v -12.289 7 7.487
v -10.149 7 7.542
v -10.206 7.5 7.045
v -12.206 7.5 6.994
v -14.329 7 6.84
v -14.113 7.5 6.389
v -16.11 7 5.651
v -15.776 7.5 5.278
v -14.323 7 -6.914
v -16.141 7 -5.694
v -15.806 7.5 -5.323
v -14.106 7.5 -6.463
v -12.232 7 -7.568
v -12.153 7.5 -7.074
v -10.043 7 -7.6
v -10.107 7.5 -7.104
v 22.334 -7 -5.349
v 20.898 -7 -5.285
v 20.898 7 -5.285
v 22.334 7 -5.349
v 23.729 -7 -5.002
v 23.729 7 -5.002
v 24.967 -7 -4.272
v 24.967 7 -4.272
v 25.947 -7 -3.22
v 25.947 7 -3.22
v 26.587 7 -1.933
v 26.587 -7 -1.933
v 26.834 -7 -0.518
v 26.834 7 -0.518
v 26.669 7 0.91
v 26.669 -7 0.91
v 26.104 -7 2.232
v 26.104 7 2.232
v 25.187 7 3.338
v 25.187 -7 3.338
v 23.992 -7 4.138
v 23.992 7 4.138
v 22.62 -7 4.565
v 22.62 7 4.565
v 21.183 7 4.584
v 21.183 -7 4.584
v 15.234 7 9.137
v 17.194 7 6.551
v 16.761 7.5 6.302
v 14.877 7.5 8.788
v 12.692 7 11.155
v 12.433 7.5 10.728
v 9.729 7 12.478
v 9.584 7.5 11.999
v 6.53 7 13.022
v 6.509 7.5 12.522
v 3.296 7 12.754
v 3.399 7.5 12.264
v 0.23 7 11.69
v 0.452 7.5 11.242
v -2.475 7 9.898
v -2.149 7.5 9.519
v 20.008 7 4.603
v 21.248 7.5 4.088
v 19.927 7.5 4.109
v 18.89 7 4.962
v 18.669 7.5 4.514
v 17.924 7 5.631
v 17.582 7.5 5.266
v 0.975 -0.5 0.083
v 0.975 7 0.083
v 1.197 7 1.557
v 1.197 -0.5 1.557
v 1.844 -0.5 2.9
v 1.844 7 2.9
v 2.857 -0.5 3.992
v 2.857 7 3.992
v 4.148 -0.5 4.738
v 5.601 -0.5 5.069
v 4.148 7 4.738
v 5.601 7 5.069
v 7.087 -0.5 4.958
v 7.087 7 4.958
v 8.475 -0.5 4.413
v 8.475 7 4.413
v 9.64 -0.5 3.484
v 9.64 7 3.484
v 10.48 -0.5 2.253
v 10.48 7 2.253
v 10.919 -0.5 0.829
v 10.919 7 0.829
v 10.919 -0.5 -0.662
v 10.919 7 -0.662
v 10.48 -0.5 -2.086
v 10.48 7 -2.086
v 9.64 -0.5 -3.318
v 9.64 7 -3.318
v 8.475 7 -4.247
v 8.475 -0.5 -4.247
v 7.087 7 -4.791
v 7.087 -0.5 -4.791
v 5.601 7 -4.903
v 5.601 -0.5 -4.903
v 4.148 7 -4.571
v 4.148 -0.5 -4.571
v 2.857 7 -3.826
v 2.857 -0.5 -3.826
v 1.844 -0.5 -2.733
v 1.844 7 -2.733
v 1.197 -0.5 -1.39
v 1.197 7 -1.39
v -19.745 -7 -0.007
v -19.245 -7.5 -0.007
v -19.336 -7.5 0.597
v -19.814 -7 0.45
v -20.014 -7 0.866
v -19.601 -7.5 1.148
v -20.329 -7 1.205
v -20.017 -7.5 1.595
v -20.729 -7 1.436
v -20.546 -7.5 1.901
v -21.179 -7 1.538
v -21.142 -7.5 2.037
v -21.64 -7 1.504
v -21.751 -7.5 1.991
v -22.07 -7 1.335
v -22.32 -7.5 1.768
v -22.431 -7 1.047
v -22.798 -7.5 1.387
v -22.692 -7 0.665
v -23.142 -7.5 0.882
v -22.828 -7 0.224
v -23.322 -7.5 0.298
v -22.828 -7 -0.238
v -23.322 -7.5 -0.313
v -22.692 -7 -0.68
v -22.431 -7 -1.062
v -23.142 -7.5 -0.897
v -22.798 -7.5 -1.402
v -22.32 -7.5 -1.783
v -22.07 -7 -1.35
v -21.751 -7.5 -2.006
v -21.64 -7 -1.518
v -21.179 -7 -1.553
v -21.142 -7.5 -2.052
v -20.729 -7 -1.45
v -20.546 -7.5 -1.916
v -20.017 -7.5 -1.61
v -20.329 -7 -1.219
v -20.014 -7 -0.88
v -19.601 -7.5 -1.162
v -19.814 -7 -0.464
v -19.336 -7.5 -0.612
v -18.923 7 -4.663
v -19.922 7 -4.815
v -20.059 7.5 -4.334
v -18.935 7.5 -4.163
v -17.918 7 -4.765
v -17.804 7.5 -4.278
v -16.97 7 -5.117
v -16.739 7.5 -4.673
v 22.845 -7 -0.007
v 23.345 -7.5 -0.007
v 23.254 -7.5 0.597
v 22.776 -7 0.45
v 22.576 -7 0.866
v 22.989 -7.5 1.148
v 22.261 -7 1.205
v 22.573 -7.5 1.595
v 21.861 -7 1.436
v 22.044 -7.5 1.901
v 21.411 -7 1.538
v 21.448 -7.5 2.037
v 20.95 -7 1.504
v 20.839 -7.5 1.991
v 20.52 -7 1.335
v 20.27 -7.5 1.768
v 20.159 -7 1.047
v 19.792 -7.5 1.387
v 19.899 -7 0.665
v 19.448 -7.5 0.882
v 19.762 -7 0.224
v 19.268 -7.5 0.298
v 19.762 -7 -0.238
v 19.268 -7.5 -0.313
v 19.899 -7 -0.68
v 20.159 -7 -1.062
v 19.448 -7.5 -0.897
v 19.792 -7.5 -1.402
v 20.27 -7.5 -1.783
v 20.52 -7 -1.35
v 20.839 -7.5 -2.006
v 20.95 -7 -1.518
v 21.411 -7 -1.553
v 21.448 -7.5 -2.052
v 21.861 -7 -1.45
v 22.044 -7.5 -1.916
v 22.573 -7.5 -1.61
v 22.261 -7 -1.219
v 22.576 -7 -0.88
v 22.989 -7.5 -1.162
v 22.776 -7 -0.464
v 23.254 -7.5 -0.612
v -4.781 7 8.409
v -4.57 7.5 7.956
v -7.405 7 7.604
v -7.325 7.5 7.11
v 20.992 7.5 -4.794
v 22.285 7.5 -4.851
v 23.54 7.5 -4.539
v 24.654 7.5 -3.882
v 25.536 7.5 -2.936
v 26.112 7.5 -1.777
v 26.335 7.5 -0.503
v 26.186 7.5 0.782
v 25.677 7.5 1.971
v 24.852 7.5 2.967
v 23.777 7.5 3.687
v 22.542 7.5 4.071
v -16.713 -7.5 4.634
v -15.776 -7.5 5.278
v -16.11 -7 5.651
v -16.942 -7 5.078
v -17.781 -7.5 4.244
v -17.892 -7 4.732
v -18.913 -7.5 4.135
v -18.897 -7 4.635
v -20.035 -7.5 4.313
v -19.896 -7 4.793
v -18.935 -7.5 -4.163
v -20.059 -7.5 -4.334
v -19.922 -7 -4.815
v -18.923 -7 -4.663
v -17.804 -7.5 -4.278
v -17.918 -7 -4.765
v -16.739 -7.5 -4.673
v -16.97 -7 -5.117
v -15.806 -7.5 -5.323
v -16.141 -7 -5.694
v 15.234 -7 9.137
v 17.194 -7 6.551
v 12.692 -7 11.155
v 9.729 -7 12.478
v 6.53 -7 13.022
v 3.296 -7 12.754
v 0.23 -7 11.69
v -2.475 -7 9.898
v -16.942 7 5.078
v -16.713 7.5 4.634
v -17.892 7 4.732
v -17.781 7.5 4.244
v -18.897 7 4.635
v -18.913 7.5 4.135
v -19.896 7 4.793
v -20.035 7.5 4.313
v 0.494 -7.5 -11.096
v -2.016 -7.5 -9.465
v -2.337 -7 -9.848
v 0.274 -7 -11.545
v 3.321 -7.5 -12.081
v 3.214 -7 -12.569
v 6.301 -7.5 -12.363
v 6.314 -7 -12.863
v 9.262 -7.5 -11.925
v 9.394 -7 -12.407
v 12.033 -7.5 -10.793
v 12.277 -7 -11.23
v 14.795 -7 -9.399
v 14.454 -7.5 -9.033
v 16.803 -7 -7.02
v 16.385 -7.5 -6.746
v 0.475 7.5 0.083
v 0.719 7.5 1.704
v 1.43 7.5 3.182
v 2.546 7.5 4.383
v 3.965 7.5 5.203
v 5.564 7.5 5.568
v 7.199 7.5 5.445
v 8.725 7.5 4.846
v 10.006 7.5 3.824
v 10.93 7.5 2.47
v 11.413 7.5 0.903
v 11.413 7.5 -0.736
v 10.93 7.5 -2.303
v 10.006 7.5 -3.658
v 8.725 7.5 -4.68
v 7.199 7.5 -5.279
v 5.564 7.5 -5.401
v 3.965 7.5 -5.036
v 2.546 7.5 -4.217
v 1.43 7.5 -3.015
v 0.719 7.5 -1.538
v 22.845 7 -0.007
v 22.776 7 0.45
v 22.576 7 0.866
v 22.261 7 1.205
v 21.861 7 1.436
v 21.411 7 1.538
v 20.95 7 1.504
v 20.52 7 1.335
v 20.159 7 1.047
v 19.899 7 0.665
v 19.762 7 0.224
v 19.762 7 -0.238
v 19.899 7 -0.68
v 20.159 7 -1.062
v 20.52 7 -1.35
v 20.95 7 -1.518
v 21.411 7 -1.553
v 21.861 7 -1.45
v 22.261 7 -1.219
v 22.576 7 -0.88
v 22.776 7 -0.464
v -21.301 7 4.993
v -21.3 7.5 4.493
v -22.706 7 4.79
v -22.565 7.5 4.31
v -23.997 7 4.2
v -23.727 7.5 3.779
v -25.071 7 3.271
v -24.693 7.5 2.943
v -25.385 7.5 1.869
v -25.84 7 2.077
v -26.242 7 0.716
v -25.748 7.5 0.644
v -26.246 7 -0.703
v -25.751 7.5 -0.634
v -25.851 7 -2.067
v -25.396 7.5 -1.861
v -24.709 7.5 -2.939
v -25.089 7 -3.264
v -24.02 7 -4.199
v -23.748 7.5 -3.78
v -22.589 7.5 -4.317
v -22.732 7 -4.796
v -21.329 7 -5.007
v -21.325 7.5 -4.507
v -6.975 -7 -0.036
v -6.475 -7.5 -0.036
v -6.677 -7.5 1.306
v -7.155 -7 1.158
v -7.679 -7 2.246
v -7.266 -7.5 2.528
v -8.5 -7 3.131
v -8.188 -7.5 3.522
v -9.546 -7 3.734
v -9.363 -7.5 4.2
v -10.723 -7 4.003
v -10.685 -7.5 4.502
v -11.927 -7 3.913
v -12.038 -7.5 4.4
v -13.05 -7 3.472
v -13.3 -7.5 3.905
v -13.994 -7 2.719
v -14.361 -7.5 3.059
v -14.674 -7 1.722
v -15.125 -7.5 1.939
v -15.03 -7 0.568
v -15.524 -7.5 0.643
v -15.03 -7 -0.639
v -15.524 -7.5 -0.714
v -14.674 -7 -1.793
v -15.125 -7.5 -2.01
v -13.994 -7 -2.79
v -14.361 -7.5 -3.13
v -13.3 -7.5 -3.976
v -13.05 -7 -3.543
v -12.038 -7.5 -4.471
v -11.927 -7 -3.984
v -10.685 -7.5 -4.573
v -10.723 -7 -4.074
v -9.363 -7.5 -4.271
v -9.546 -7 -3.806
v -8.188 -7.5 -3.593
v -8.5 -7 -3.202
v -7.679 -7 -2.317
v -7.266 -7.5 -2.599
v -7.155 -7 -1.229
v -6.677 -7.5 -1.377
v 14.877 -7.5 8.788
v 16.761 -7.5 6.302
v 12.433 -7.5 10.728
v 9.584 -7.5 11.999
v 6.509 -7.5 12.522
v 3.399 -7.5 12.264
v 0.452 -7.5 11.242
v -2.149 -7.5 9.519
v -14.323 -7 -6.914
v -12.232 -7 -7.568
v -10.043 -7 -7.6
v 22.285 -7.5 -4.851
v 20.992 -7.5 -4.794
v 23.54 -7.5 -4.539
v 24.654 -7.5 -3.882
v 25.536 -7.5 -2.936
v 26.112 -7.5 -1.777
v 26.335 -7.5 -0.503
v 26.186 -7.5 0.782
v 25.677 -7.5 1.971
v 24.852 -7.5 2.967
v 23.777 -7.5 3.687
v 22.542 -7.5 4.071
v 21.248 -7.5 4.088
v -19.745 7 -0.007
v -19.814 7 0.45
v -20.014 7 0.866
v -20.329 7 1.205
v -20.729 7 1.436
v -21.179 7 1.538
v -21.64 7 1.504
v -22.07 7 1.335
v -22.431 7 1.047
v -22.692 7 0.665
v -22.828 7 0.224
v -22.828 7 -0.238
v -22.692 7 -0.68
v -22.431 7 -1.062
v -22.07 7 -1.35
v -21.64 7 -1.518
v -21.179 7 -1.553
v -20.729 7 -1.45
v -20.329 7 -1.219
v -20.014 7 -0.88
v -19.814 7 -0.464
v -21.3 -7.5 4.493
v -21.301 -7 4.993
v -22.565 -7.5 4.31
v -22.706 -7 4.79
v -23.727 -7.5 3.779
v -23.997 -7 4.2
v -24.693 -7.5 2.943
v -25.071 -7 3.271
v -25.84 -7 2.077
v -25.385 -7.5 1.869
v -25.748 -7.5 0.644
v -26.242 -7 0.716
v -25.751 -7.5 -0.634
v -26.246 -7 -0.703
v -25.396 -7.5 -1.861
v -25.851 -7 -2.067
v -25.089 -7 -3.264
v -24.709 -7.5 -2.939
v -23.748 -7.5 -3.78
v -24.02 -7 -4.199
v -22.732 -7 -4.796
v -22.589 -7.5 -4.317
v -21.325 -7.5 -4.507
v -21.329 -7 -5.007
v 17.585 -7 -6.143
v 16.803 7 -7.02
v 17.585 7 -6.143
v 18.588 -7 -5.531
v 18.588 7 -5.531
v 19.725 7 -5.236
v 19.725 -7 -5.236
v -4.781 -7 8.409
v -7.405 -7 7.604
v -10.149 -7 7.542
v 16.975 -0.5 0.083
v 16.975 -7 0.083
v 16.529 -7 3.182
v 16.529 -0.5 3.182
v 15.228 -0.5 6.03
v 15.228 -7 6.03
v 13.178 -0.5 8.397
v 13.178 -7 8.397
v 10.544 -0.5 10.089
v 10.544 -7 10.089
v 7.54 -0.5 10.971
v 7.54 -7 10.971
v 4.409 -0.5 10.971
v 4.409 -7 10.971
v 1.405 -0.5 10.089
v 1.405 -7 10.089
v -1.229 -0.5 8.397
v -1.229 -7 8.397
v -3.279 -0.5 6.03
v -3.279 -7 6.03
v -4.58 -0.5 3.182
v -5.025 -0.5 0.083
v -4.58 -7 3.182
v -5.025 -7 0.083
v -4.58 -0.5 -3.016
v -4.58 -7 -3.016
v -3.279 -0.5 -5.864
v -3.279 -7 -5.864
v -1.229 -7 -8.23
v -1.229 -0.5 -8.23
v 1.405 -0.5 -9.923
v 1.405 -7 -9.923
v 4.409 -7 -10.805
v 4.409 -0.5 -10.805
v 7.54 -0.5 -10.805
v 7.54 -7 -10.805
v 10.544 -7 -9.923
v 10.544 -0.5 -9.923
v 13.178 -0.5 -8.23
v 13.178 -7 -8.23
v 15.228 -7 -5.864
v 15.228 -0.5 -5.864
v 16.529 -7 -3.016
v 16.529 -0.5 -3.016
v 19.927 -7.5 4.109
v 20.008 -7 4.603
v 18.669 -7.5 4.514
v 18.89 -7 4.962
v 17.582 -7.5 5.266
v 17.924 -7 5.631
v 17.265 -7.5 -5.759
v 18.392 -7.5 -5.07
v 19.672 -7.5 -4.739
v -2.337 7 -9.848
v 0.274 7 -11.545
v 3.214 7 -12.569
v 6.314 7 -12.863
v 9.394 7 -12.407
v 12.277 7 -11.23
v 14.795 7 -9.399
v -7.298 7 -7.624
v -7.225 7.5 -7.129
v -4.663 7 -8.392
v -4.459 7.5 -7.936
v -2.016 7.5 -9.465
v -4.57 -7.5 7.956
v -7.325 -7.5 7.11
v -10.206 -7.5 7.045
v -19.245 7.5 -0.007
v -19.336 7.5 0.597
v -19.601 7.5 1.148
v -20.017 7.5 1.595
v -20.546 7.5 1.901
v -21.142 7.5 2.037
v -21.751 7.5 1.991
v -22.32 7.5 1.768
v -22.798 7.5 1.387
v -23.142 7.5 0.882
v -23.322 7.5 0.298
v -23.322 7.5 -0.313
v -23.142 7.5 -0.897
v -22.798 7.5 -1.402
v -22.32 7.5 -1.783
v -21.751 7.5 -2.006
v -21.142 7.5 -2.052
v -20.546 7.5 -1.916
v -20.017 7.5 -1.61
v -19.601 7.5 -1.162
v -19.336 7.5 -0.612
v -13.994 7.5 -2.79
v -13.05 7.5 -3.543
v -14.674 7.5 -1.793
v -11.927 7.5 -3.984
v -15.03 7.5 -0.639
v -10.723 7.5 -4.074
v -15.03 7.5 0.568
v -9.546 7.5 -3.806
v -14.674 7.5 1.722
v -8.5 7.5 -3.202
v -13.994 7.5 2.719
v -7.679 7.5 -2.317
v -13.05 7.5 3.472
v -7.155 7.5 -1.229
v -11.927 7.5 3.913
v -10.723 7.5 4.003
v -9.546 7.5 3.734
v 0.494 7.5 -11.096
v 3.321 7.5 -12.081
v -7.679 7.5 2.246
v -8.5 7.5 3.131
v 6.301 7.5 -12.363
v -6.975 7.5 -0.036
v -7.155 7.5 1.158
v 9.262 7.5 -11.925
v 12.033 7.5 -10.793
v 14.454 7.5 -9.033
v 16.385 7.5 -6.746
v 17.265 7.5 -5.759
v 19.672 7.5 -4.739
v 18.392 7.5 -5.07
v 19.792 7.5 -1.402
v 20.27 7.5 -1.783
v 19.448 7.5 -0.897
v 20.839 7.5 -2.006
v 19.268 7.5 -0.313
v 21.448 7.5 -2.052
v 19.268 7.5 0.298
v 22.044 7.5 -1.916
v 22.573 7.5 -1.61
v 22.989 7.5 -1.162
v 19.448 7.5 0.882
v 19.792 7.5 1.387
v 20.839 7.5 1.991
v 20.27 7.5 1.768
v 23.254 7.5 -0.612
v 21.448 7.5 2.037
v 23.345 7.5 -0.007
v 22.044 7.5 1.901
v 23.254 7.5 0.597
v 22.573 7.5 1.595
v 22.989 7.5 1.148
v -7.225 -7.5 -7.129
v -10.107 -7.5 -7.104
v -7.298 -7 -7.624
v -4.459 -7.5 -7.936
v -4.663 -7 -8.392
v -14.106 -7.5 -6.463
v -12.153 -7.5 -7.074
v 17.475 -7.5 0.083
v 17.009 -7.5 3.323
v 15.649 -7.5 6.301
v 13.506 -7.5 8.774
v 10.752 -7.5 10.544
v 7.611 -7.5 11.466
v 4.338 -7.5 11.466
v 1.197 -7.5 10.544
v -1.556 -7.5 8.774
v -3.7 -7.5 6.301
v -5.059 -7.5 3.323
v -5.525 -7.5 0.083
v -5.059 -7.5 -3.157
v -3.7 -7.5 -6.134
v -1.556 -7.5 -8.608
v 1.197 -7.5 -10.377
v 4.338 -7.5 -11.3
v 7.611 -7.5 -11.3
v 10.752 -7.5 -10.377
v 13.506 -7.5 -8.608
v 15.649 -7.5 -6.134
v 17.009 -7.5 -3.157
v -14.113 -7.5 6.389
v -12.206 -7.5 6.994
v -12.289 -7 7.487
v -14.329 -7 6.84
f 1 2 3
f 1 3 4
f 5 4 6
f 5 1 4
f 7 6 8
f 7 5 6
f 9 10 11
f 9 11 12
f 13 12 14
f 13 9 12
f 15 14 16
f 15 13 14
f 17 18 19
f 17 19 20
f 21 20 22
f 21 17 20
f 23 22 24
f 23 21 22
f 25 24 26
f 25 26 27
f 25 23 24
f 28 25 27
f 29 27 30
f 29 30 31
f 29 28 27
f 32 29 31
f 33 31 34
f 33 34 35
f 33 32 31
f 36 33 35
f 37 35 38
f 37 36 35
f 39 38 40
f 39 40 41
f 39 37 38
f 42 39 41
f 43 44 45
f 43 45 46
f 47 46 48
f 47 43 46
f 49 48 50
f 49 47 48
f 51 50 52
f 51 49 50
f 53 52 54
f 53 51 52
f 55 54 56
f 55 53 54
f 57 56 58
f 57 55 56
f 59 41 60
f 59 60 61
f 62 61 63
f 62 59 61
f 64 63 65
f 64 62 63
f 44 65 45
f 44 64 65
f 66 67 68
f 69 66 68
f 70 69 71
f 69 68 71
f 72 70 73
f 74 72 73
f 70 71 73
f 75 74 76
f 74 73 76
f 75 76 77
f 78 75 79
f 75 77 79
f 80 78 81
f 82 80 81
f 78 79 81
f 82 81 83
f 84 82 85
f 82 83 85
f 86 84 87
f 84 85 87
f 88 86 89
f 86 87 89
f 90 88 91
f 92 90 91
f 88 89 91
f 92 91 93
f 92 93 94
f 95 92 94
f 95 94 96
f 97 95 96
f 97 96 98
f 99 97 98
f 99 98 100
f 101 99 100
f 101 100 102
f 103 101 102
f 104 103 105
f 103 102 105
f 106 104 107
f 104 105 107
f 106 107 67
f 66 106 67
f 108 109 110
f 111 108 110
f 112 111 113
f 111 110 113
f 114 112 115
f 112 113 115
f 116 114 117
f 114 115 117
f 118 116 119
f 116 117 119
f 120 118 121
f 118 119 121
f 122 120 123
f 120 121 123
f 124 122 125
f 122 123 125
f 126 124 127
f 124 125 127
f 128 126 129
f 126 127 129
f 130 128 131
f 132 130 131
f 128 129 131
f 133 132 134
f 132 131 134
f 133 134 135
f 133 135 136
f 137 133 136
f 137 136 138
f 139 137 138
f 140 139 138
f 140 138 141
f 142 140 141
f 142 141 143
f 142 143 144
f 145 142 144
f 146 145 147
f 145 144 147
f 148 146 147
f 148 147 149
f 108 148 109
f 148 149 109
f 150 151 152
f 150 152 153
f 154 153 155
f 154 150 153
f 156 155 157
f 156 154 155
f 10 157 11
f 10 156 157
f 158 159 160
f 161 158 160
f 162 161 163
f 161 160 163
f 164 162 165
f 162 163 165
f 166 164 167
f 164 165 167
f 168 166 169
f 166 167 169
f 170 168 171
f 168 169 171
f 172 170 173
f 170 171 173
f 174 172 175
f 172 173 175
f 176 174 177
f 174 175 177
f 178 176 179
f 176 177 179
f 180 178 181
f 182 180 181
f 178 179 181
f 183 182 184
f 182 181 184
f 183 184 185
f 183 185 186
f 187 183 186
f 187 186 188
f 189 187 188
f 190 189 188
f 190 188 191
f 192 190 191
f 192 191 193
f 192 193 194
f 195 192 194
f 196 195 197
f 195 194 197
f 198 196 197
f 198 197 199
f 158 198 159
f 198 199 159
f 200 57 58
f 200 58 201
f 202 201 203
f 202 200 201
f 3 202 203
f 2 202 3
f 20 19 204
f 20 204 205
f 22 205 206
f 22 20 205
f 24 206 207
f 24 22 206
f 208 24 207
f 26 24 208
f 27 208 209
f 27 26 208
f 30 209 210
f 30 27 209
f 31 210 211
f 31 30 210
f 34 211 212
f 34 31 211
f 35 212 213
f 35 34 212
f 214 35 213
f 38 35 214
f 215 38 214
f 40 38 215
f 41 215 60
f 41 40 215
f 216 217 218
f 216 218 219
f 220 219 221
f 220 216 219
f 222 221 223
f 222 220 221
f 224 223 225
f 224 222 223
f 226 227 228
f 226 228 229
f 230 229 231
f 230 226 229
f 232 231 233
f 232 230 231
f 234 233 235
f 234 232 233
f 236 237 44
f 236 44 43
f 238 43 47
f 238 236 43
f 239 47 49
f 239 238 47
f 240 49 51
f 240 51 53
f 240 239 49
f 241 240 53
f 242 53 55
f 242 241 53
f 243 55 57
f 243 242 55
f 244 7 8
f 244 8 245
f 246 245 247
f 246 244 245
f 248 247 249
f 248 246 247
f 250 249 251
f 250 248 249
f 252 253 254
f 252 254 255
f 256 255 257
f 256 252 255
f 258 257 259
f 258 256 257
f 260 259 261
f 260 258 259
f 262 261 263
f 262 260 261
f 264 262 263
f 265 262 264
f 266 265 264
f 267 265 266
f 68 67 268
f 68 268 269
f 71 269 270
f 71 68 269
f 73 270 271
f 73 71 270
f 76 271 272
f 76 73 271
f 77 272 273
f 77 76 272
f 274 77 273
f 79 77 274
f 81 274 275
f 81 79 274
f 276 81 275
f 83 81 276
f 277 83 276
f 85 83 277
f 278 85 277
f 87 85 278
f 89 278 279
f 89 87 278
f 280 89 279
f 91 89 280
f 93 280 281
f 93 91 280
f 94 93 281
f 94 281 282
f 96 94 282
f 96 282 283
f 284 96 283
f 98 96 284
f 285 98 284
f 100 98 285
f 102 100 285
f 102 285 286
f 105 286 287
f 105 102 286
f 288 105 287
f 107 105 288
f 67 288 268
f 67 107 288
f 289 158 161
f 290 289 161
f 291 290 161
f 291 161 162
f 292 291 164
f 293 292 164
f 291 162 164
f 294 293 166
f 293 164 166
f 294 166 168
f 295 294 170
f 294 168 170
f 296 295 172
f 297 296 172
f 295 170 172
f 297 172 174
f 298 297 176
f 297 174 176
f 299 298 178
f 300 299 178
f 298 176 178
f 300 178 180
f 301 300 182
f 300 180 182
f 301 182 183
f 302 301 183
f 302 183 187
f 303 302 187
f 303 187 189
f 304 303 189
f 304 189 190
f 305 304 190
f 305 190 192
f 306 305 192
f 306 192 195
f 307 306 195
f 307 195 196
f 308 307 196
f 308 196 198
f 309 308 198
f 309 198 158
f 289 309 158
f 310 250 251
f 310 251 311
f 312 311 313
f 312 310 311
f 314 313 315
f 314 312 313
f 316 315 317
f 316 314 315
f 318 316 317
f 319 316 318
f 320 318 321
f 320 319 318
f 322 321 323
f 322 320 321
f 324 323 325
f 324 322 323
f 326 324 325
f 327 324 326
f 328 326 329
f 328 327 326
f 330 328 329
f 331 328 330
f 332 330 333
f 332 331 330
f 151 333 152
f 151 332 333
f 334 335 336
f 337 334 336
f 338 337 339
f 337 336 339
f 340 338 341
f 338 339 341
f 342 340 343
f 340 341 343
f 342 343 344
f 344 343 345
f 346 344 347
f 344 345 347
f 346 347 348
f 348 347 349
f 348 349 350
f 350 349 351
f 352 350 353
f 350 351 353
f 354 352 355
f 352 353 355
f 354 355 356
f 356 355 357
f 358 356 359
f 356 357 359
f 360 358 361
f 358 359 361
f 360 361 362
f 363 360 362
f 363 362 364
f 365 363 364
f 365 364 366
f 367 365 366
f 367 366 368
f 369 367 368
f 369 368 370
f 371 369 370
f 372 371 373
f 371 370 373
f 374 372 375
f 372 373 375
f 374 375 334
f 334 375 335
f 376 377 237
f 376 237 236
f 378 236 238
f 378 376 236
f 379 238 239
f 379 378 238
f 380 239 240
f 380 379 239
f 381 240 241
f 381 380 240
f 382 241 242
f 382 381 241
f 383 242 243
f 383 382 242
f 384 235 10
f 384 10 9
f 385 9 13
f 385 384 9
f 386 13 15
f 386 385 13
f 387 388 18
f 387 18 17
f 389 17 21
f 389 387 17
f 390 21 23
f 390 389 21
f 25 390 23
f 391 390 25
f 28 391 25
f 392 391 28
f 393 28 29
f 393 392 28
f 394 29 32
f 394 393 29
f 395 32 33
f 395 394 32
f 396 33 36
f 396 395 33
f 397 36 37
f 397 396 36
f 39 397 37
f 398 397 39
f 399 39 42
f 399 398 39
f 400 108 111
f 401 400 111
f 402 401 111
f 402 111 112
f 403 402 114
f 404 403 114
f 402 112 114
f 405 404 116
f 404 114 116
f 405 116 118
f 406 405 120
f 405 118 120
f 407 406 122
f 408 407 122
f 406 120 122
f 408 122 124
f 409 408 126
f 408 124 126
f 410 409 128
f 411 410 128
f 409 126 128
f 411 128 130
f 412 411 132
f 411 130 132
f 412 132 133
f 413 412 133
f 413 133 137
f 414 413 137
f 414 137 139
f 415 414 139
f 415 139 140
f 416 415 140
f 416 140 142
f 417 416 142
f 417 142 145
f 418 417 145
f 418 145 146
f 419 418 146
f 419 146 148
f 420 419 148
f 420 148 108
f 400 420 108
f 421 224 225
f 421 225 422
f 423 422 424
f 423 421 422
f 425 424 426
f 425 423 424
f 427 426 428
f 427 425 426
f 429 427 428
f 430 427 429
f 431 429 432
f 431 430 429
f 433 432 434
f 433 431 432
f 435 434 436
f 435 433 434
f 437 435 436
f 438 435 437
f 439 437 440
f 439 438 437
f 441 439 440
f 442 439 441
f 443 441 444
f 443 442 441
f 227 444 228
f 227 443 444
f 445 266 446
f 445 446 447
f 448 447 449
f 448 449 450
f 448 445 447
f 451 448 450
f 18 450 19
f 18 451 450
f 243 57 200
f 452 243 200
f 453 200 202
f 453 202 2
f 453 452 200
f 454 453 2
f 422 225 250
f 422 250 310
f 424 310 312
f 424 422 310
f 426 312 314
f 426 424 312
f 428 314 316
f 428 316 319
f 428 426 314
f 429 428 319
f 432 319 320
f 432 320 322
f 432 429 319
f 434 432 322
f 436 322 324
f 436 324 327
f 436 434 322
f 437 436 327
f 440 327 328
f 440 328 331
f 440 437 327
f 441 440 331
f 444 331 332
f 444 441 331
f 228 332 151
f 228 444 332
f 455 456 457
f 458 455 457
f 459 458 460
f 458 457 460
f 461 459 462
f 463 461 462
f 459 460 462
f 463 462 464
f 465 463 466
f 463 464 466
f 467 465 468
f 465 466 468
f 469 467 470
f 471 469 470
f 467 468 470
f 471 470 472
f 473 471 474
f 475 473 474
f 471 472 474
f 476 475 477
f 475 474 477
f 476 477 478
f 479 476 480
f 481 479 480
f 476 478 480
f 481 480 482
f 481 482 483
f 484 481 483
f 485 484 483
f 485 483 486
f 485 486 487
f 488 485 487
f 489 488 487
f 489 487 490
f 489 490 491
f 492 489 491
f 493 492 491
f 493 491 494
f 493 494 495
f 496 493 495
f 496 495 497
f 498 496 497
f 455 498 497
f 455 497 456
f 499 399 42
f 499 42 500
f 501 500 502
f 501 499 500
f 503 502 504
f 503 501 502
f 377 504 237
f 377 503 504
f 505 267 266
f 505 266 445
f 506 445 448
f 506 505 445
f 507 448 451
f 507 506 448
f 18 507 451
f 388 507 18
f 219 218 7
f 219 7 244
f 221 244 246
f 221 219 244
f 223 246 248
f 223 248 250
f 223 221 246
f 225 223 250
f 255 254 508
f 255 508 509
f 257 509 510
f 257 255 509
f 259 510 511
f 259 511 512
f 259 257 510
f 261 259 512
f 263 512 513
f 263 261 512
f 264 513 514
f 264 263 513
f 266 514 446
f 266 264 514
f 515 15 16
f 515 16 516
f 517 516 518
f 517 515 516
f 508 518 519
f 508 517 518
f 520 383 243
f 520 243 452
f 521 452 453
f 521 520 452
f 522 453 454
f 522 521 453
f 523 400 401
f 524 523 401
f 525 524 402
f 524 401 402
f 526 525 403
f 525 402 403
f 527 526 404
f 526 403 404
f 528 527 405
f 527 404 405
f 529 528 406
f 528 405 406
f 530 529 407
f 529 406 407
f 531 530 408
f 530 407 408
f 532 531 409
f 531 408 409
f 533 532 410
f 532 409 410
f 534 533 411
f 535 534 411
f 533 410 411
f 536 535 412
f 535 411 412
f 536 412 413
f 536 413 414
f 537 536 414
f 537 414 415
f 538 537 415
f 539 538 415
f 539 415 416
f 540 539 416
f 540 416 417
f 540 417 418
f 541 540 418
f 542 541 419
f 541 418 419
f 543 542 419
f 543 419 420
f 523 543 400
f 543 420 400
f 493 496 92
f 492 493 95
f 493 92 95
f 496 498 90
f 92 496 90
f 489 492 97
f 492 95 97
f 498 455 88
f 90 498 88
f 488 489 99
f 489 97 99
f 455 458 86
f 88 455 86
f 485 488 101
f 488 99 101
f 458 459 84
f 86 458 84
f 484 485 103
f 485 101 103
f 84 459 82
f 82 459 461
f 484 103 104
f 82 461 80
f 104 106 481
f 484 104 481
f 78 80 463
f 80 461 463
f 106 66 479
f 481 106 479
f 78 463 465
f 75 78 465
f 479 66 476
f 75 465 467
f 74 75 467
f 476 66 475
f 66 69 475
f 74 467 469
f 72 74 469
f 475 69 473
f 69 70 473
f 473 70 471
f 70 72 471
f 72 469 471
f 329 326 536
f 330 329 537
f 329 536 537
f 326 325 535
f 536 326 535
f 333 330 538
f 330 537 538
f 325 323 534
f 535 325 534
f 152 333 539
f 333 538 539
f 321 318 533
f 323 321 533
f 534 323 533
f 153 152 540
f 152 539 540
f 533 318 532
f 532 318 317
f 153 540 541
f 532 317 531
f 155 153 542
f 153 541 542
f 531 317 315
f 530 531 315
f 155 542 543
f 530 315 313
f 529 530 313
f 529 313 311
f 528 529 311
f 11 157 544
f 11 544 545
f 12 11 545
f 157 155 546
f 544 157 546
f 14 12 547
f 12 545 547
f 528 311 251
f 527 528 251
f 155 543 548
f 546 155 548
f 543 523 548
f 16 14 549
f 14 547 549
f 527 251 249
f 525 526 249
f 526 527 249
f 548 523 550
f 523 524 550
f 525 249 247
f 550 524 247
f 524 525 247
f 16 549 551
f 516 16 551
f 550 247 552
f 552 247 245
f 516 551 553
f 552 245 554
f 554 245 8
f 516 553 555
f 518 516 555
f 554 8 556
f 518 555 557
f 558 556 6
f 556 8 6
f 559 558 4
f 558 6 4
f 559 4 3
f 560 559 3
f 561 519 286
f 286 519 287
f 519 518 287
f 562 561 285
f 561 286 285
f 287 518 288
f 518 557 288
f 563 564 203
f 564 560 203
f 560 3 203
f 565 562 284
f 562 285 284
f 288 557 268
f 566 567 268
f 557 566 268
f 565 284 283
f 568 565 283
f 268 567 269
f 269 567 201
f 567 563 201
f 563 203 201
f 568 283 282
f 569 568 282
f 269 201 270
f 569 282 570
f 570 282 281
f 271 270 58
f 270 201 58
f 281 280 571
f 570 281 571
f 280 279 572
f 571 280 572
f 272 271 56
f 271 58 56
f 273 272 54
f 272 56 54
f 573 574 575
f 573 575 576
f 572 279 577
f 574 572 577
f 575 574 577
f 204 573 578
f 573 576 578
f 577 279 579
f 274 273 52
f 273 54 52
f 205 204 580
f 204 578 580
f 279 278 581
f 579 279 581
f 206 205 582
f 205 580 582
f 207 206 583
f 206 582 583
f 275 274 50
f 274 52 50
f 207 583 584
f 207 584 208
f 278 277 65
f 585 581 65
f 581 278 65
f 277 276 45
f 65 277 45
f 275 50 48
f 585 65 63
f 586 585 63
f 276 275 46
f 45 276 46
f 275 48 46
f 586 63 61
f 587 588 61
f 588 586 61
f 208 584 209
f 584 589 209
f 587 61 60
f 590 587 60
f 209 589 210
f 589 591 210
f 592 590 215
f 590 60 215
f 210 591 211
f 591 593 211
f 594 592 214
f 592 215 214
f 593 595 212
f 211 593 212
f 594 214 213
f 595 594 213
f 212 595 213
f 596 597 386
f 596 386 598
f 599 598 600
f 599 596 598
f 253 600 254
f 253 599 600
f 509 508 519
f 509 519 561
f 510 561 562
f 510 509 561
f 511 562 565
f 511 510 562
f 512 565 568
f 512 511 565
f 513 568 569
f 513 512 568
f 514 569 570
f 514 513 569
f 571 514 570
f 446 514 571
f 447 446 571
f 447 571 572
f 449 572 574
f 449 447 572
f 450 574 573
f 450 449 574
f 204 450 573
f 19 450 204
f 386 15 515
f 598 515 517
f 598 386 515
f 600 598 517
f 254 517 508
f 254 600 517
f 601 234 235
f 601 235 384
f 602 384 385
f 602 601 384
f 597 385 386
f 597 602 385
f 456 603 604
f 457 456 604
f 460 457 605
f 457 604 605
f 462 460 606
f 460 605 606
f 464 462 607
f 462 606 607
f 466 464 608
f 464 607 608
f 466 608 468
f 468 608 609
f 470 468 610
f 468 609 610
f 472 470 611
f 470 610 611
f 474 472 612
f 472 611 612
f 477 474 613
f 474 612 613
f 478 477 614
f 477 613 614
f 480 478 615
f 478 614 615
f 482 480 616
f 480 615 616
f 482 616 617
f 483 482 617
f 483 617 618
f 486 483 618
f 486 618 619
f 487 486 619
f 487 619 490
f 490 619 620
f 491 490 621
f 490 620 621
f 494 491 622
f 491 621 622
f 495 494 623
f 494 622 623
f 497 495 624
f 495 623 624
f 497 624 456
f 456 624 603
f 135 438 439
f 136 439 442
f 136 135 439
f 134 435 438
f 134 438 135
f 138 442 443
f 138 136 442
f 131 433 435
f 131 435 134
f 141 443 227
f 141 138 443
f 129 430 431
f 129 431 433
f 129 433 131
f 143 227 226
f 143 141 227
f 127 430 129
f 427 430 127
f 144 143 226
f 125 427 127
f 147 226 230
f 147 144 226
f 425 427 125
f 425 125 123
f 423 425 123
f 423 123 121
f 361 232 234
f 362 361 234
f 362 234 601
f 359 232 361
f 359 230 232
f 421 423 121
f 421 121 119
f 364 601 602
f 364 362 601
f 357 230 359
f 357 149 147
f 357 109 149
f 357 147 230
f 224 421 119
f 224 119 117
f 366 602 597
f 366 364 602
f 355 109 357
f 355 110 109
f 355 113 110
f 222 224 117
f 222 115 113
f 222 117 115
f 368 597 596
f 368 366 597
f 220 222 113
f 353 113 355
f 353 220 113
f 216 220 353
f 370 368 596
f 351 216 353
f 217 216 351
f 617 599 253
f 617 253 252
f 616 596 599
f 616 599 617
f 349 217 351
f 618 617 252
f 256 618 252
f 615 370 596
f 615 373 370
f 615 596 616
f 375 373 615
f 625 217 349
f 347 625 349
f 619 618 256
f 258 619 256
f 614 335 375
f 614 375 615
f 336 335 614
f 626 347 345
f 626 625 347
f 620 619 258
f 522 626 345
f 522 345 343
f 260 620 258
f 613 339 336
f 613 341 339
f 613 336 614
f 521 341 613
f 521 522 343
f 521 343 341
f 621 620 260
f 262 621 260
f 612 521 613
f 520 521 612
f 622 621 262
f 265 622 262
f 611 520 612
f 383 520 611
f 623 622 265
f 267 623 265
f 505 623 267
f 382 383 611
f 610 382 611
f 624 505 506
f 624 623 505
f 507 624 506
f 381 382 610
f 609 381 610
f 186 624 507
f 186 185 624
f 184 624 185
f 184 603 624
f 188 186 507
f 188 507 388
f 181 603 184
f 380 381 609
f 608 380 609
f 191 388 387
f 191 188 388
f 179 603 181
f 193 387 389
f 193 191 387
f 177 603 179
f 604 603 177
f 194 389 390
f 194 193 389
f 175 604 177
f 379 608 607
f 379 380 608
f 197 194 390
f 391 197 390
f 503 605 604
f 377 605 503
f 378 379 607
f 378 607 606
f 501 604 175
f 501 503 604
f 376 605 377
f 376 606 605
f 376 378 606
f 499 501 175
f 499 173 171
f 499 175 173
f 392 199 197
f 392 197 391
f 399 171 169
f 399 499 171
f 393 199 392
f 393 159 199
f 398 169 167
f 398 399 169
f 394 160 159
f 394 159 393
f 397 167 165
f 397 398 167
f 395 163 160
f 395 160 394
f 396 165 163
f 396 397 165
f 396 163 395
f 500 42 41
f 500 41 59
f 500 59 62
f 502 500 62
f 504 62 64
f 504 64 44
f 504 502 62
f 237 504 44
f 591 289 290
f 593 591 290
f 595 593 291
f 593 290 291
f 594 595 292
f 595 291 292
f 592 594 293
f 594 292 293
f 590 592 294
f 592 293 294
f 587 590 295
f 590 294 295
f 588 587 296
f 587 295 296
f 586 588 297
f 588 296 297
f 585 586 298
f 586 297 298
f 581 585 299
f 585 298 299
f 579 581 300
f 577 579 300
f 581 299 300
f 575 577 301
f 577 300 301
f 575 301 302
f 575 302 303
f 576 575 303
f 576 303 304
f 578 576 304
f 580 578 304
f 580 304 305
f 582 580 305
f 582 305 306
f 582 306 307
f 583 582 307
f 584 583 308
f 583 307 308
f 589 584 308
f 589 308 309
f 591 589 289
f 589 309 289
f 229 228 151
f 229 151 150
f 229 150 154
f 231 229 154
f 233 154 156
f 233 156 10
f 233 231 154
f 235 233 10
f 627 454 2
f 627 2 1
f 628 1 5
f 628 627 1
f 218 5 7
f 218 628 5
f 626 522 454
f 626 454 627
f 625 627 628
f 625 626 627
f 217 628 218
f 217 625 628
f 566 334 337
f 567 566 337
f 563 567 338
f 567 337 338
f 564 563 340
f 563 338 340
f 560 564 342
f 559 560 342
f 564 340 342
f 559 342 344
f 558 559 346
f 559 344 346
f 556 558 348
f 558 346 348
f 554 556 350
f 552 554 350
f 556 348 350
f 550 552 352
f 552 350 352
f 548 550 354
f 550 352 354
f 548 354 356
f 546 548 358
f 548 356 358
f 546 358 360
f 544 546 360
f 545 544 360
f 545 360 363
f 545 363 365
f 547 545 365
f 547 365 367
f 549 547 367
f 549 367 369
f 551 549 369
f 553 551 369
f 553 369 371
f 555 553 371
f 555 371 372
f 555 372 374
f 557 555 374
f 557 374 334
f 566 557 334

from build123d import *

# Parameters (mm, degrees)
F1_R     = 1.5499996566
F1_R_2   = 4.05
F1_R_3   = 11
F2_DEPTH = 15
F3_R     = 1.5499996566
F3_R_2   = 11
F3_R_3   = 4.05
F3_R_4   = 5
F4_DEPTH = 8
F5_SIZE  = 0.5


# Not quite as in the source:
# - a feature names something its author has since deleted; it is built from what else it names


with BuildPart() as f2:
    # F1 (on offset) → F2 (new body)
    with BuildSketch(Plane.XZ.offset(7.5)):
        with BuildLine():
            ThreePointArc((-16.1097446178, 5.6510393794), (-17.8915523622, 4.7319149036), (-19.8955278727, 4.792831184))
            ThreePointArc((-19.8955278727, 4.792831184), (-26.2950637706, 0.0064660896), (-19.9219776461, -4.815061031))
            ThreePointArc((-19.9219776461, -4.815061031), (-17.917697117, -4.7651791649), (-16.1409768963, -5.694099989))
            ThreePointArc((-16.1409768963, -5.694099989), (-13.3010298936, -7.316379445), (-10.0427278071, -7.6002053168))
            ThreePointArc((-10.0427278071, -7.6002053168), (-5.9542872002, -7.917007121), (-2.3367475524, -9.848099267))
            ThreePointArc((-2.3367475524, -9.848099267), (7.8678117277, -12.7279820224), (16.8033240158, -7.0197971151))
            ThreePointArc((16.8033240158, -7.0197971151), (18.58751675, -5.5306692402), (20.898442998, -5.2847720721))
            ThreePointArc((20.898442998, -5.2847720721), (26.8344703592, -0.5175206843), (21.1826859269, 4.5835026796))
            ThreePointArc((21.1826859269, 4.5835026796), (18.8897447965, 4.9620083109), (17.1942238361, 6.5513648516))
            ThreePointArc((17.1942238361, 6.5513648516), (8.1466571288, 12.85030216), (-2.4748372324, 9.8975183761))
            ThreePointArc((-2.4748372324, 9.8975183761), (-6.0650144321, 7.9160195357), (-10.1486242942, 7.5420670334))
            ThreePointArc((-10.1486242942, 7.5420670334), (-13.3318829255, 7.2355232201), (-16.1097446178, 5.6510393794))
        make_face()
        with Locations((-21.2950828407, -0.0072984656)):
            Circle(F1_R, mode=Mode.SUBTRACT)
        with Locations((-11.0252965242, -0.0355703814)):
            Circle(F1_R_2, mode=Mode.SUBTRACT)
        with Locations((21.2950848365, -0.0073001884)):
            Circle(F1_R, mode=Mode.SUBTRACT)
        with Locations((5.9747034758, 0.0833180019)):
            Circle(F1_R_3, mode=Mode.SUBTRACT)
    extrude(amount=-F2_DEPTH)

    # F3 (on face) → F4 (join)
    with BuildSketch(Plane(origin=(0, 7.5, 0), x_dir=(-1, 0, 0), z_dir=(0, 1, 0))):
        with BuildLine():
            ThreePointArc((10.1486242942, 7.5420670334), (6.0650144321, 7.9160195357), (2.4748372324, 9.8975183761))
            ThreePointArc((2.4748372324, 9.8975183761), (-8.1466571288, 12.85030216), (-17.1942238361, 6.5513648516))
            ThreePointArc((-17.1942238361, 6.5513648516), (-18.8897447965, 4.9620083109), (-21.1826859269, 4.5835026796))
            ThreePointArc((-21.1826859269, 4.5835026796), (-26.8344703592, -0.5175206843), (-20.898442998, -5.2847720721))
            ThreePointArc((-20.898442998, -5.2847720721), (-18.58751675, -5.5306692402), (-16.8033240158, -7.0197971151))
            ThreePointArc((-16.8033240158, -7.0197971151), (-7.8678117277, -12.7279820224), (2.3367475524, -9.848099267))
            ThreePointArc((2.3367475524, -9.848099267), (5.9542872002, -7.917007121), (10.0427278071, -7.6002053168))
            ThreePointArc((10.0427278071, -7.6002053168), (13.3010298936, -7.316379445), (16.1409768963, -5.694099989))
            ThreePointArc((16.1409768963, -5.694099989), (17.917697117, -4.7651791649), (19.9219776461, -4.815061031))
            ThreePointArc((19.9219776461, -4.815061031), (26.2950637706, 0.0064660896), (19.8955278727, 4.792831184))
            ThreePointArc((19.8955278727, 4.792831184), (17.8915523622, 4.7319149036), (16.1097446178, 5.6510393794))
            ThreePointArc((16.1097446178, 5.6510393794), (13.3318829255, 7.2355232201), (10.1486242942, 7.5420670334))
        make_face()
        with Locations((-21.2950848365, -0.0073001884)):
            Circle(F3_R, mode=Mode.SUBTRACT)
        with Locations((-5.9747034758, 0.0833180019)):
            Circle(F3_R_2, mode=Mode.SUBTRACT)
        with Locations((11.0252965242, -0.0355703814)):
            Circle(F3_R_3, mode=Mode.SUBTRACT)
        with Locations((21.2950828407, -0.0072984656)):
            Circle(F3_R, mode=Mode.SUBTRACT)
        with Locations((-5.9747034758, 0.0833180019)):
            Circle(F3_R_2)
        with Locations((-5.9747034758, 0.0833180019)):
            Circle(F3_R_4, mode=Mode.SUBTRACT)
    extrude(amount=-F4_DEPTH)

    # F5
    f5_edges = [f2.edges().sort_by_distance(p)[0] for p in [
        (-6.065014, -7.5, 7.91602),
        (8.146657, -7.5, 12.850302),
        (18.889745, -7.5, 4.962008),
        (26.83447, -7.5, -0.517521),
        (18.587517, -7.5, -5.530669),
        (7.867812, -7.5, -12.727982),
        (-5.954287, -7.5, -7.917007),
        (-13.30103, -7.5, -7.316379),
        (-17.917697, -7.5, -4.765179),
        (-26.295064, -7.5, 0.006466),
        (-17.891552, -7.5, 4.731915),
        (-13.331883, -7.5, 7.235523),
        (-5.025297, -7.5, 0.083318),
        (-22.845082, -7.5, -0.007298),
        (19.745085, -7.5, -0.0073),
        (8.146657, 7.5, 12.850302),
        (-22.845082, 7.5, -0.007298),
        (10.974703, 7.5, 0.083318),
        (19.745085, 7.5, -0.0073),
        (-15.075297, -7.5, -0.03557),
        (-6.065014, 7.5, 7.91602),
        (-13.331883, 7.5, 7.235523),
        (-17.891552, 7.5, 4.731915),
        (-26.295064, 7.5, 0.006466),
        (-17.917697, 7.5, -4.765179),
        (-13.30103, 7.5, -7.316379),
        (-5.954287, 7.5, -7.917007),
        (7.867812, 7.5, -12.727982),
        (18.587517, 7.5, -5.530669),
        (26.83447, 7.5, -0.517521),
        (18.889745, 7.5, 4.962008),
    ]]
    chamfer(f5_edges, length=F5_SIZE)


solid = f2.part
